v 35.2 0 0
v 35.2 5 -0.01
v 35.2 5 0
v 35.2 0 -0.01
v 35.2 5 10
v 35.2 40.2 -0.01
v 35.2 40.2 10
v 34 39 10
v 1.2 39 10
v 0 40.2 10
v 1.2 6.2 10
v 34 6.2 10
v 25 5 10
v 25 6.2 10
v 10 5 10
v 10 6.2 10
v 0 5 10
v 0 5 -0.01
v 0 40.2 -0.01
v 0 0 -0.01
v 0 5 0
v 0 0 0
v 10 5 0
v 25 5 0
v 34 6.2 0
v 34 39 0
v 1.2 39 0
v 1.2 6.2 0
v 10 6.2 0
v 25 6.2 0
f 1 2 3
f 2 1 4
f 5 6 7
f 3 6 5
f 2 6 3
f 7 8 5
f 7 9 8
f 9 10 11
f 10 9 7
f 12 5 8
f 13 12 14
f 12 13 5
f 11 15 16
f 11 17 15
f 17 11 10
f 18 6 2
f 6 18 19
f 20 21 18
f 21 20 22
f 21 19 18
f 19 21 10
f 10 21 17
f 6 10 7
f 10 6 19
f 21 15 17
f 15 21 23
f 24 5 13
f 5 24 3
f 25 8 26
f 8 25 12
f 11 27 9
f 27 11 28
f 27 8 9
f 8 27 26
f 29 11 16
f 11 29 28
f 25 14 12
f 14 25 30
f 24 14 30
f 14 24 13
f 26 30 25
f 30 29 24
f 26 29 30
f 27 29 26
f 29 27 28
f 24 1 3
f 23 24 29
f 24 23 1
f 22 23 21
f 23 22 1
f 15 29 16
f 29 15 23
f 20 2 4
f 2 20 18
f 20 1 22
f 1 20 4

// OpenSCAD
// file: ../Base/Boxes.scad
// Fischertechnik Box Foundation
// Pre-designed Boxes

use <Constants.scad>

include <PlacementOptions.scad>

box190Width = 190;
box190Depth = 130;
box130Width = 130;
box130Depth = 95;
boxUsageHeight = 33.9;
boxWallThickness = 2.4;
boxBaseThickness = 1.0;

// getBoxWallThickness()
// Gets the wall thickness of a Fischertechnik Box

function getBoxWallThickness() = boxWallThickness;

// Gets the usable height of a fischertechnik box
function getBoxUsageHeight() = boxUsageHeight;

// Gets the thickness of the Fischertechnik box base.
function getBoxBaseThickness() = boxBaseThickness;

// Gets the usable inner space of a Box 190 as an x/y-list
function getBox190Space() = [
    box190Width - 2*getBoxWallThickness(), 
    box190Depth - 2*getBoxWallThickness() ];

// Imports the Fischertechnik empty box 130x190 mm and places it at position 0,0
// 190x130 are the outer sizes, the inner space is slightly smaller. Use getBox190Space() to get the inner sizes.
// This module needs the STL file "Fischertechnik Box 130x190.stl" in the library path.
// The box is positioned that the usable inner space is at the 0,0,0 position. The

module Box190() {
    translate([-getBoxWallThickness(),-getBoxWallThickness(),-getBoxBaseThickness()])
        import("Fischertechnik Box 130x190.stl", convexity=3);
}

// Gets the usable inner space of a Box 130 as an x/y-list
function getBox130Space() = [
    box130Width - 2*getBoxWallThickness(), 
    box130Depth - 2*getBoxWallThickness() ];

// Imports the Fischertechnik empty box 95x130 mm and places it at position 0,0
// 190x130 are the outer sizes, the inner space is slightly smaller. Use getBox190Space() to get the inner sizes.
// This module needs the STL file "Fischertechnik Box 95x130.stl" in the library path.
// The box is positioned that the usable inner space is at the 0,0,0 position. The

module Box130() {
    translate([-getBoxWallThickness(),-getBoxWallThickness(),-getBoxBaseThickness()])
        import("Fischertechnik Box 95x130.stl", convexity=3);
}

// Creates a web at the specified box walls
// corner 0 = LowerLeft, 1 = UpperLeft, 2 = UpperRight, 3 = LowerRight
// side 0 = LeftOfCorner, 1 = RightOfCorner
// distance = Distance in mm from the corner
// box = inner width and depth of the box (default: Box 190)
// webWidth = length of the web (default is 3 mms)
// webThickness = thickness of the web (default is 1 mm)

module BoxWeb(corner, side, distance, box=getBox190Space(), webWidth=3, webThickness=1.0) {
    sink = getBoxWallThickness()/2;

    width = (corner % 2 == 0) ? 
            (side == LeftOfCorner ? webWidth : webThickness) :
            (side == LeftOfCorner ? webThickness : webWidth);

    depth = (corner % 2 == 0) ? 
            (side == RightOfCorner ? webWidth : webThickness) :
            (side == RightOfCorner ? webThickness : webWidth);
    
    xDiff = corner == LowerLeft ? 
                (side == LeftOfCorner ? -sink : distance) :
            (corner == UpperLeft ?                
                (side == LeftOfCorner ? distance : -sink) :
            (corner == UpperRight ?
                (side == LeftOfCorner ? box.x-webWidth+sink : box.x-distance-webThickness) :
                (side == LeftOfCorner ? box.x-distance-webThickness: box.x-webWidth+sink)));

    yDiff = corner == LowerLeft ? 
                (side == RightOfCorner ? -sink : distance) :
            (corner == UpperLeft ?
                (side == RightOfCorner ? box.y-distance : box.y-webWidth+sink) :
            (corner == UpperRight ?
                (side == RightOfCorner ? box.y-webWidth+sink : box.y-distance) :
                (side == RightOfCorner ? distance : -sink)));
    
    translate([xDiff, yDiff, -getExcess()])
        cube([width, depth, boxUsageHeight + 2*getExcess()]);
}
// file: ../Base/Rotation.scad
// Fischertechnik Box Foundation
// Geometry Helpers Rotation

include <PlacementOptions.scad>

// getRotatedSpace(space, rotation=NoRotation)
// Rotates the space dependent on the specified rotation

function getRotatedSpace(space, rotation=NoRotation) = [
    (rotation == Rotate90 || rotation == Rotate270) ? space.y : space.x,
    (rotation == Rotate90 || rotation == Rotate270) ? space.x : space.y
];

// Rotates the given space around the fixed left lower corner
// space = the space the children needs as width/depth list [width,depth]
// rotation = 0 Rotate0 degrees, 1 Rotate90 degrees, 2 Rotate180 degrees, 3 Rotate270 degrees (equivalent to -90)

module RotateFix(space, rotation=Rotate0) {
    dy = (rotation == Rotate0 || rotation == Rotate270) ? 0 :
        (rotation == Rotate90) ? space.x :
        space.y;
    dx = (rotation < Rotate180) ? 0 :
        (rotation == Rotate180) ? space.x :
        space.y;
    
    translate([dx, dy, 0])
        rotate([0, 0, rotations[rotation]])
            children();
}
// file: ../Base/Alignment.scad
// Fischertechnik Box Foundation
// Geometry Helpers Alignment

include <PlacementOptions.scad>

// getAlignedX(elementWidth, spaceWidth, align=AlignRight, offset=0)
// Gets the aligned X offset of an element with the given
// width in the given space.
// elementWidth = The width of the element to positon
// spaceWidth = The space where the element should be aligned
// align = 0 AlignLeft, 1 AlignCenter, 2 AlignRight
// offset = an optional offset from the aligned position. When
// aligned left or centered, then positive values are in X direction.
// When aligned right then positive values are in negative X direction.

function getAlignedX(elementWidth, spaceWidth, align=AlignRight, offset=0) =
    (align == AlignLeft) ?
        offset :
        ((align == AlignCenter) ?
        (spaceWidth - elementWidth)/2 + offset :
        spaceWidth - offset - elementWidth);

// getAlignedY(elementDepth, spaceDepth, align=AlignTop, offset=0)
// Gets the aligned Y offset of an element with the given
// depth in the given space.
// elementDepth = The depth of the element to positon
// spaceDepth = The space where the element should be aligned
// align = 0 AlignBottom, 1 AlignCenter, 2 AlignTop
// offset = an optional offset from the aligned position. When
// aligned bottom or centered, then positive values are in Y direction.
// When aligned top then positive values are in negative Y direction.

function getAlignedY(elementDepth, spaceDepth, align=AlignTop, offset=0) =
    (align == AlignBottom) ?
        offset :
        ((align == AlignCenter) ?
        (spaceDepth - elementDepth)/2 + offset :
        spaceDepth - offset - elementDepth);
// file: ../Base/PlacementOptions.scad
// Fischertechnik Box Foundation
// Placement Options

// Alignment
NoAlign = 0;
AlignLeft = 1;
AlignBottom = 2;
AlignCenter = 3;
AlignRight = 4;
AlignTop = 5;

// Element rotation degree steps
rotations = [0, -90, -180, -270];

// Rotation
NoRotation = 0;
Rotate0 = 0;
Rotate90 = 1;
Rotate180 = 2;
Rotate270 = 3;

// Docking (seen from above)
NoDock = -1;
DockLeft = 0;
DockTop = 1;
DockRight = 2;
DockCorner = 2;
DockBottom = 3;

// Web corners
LowerLeft = 0;
UpperLeft = 1;
UpperRight = 2;
LowerRight = 3;

// Web position relative to corner
LeftOfCorner = 0;
RightOfCorner = 1;
// file: ../Base/Placement.scad
// Fischertechnik Box Foundation
// Geometry Helpers Placement

use <Constants.scad>
use <Alignment.scad>
use <Rotation.scad>
use <Boxes.scad>

include <PlacementOptions.scad>

// Place(x=0, y=0, elementSpace=[0,0], alignX=AlignLeft, alignY=AlignBottom, rotation=Rotate0, boxSpace=getBox190Space())
// Places the child at the specified position
// y = Y-Position. This is a relative position when an X aligment is specified.
// x = X-Position. This is a relative position when an Y aligment is specified.
// elementSpace = space of the element to be placed [x,y]
// alignX = -1=NoAlign, 0 AlignLeft, 1 AlignCenter, 3 AlignRight (elementSpace and boxSpace required!)
// alignY = -1=NoAlign, 2 AlignBottom, 1 AlignCenter, 4 AlignTop (elementSpace and boxSpace required!)
// rotation = 0 Rotate0 0 degrees, 1 Rotate90 90 degrees, 
// 2 Rotate180 180 degrees, 3 Rotate270 270 degrees (equivalent to -90)
// boxSpace = Inner space of the box where the placement occurs [x,y] - default is Box 190x130 inner space

module Place(x=0, y=0, elementSpace=[0,0], 
  alignX=AlignLeft, alignY=AlignBottom, 
  rotation=NoRotation, boxSpace=getBox190Space()) {

    module Position(x, y, space, rotation=Rotate0) {
        translate([x, y, 0])
            RotateFix(space, rotation)
                children(0);
    }

    space = getRotatedSpace(elementSpace, rotation);
    alignedX = getAlignedX(space.x, boxSpace.x, alignX, x);
    alignedY = getAlignedY(space.y, boxSpace.y, alignY, y);
    Position(alignedX, alignedY, elementSpace, rotation)
        children(0);
}

// Center(space=getBox130Space(), elementSpace=[0,0])
// space = Space where the children is centered. For cylinder use centered=true and no elementSpace.
// elementSpace = space of the element to be centered [x,y]

module Center(space=getBox190Space(), elementSpace=[0,0]) {
    translate([(space.x - elementSpace.x) / 2, (space.y - elementSpace.y) / 2])
        children(0);
}

// CenterHorizontal(width=0, y=0, offset=0, space=getBox130Space())
// space = Space where the children is centered. For cylinder use centered=true and no elementSpace.
// elementSpace = space of the element to be centered [x,y]

module CenterHorizontal(width=0, y=0, offset=0, space=getBox190Space()) {
    translate([(space.x - width) / 2 + offset, y])
        children(0);
}

// CenterVertical(depth=0, x=0, offset=0, space=getBox130Space())
// space = Space where the children is centered. For cylinder use centered=true and no elementSpace.
// elementSpace = space of the element to be centered [x,y]

module CenterVerticalal(depth=0, x=0, offset=0, space=getBox190Space()) {
    translate([x, (space.y - depth) / 2 + offset])
        children(0);
}
// file: ../Base/Constants.scad
// Fischertechnik Box Foundation
// Constants

// Constant values necessary for multiple elements

// Base constants
dividerThickness = 1.2;
excess = 0.01;
fragments = 90;
tolerance = 0.8;

// Gets the thickness of a divider 
function getDividerThickness() = dividerThickness;

// Gets the excess that is used to merge walls into each other
function getExcess() = excess;

// Gets amount of fragments of a cylinder
function getFragments() = fragments;

// Gets the inner tolerance of a frame to each side
function getTolerance() = tolerance;


// Fischertechnik specific constants
axisDiameter = 4;
axisBottomDiameter = axisDiameter + 1;
standardEdgeDistance = 2.5;
standardWebDistance = 11.5;
standardCornerLength = 15;
tubeWallFactor = 1.6;

// Gets axis diameter
function getAxisDiameter() = axisDiameter;

// Gets axis bottom diameter for thicker part at the bottom
function getAxisBottomDiameter() = axisBottomDiameter;

// gets the standard distance to the wall of the box for dockable frames with webs
function getStandardEdgeDistance() = standardEdgeDistance;

// gets the standard distance of each web to the corner of the dockable frame
function getStandardWebDistance() = standardWebDistance;

// gets the standard length of the corner walls of a dockable frame
function getStandardCornerLength() = standardCornerLength;

// gets the wall thickness of a tube.
function getTubeWallThickness() = tubeWallFactor * getDividerThickness();
// main file
// Fischertechnik Box Library
// Frame for Reverse Switch and Push Button (old)
// 31331, 31332

use <../Base/Constants.scad>
use <../ModelBase/Simple.scad>

width = 32;
depth = 32;
height = 10;
addSwitch = 5;

// getFramePushButtonSpace()
// Gets the space the frame for reverse switch or push button needs as width and depth (.x and .y as a list)

function getFramePushButtonSpace() = getFrameOuterVolume([width, depth + addSwitch, height]);

// FramePushButton()
// The walls of the frame are 13 mm high. 
// The complete frame has a tolerance of addition 1 mm in each direction.

module FramePushButton() {
    cutoffWidth = 15;
    cutoffOffset = 10;
    
    Space(getFramePushButtonSpace());
    
    translate([0, addSwitch, 0])
    difference() {
        Frame([width, depth, height]);
        translate([cutoffOffset, -getDividerThickness()/2, 0])
            cube([cutoffWidth, 2*getDividerThickness(), height + getExcess()]);
    }
}

// Tests
color("lightgray") {
FramePushButton();
}
